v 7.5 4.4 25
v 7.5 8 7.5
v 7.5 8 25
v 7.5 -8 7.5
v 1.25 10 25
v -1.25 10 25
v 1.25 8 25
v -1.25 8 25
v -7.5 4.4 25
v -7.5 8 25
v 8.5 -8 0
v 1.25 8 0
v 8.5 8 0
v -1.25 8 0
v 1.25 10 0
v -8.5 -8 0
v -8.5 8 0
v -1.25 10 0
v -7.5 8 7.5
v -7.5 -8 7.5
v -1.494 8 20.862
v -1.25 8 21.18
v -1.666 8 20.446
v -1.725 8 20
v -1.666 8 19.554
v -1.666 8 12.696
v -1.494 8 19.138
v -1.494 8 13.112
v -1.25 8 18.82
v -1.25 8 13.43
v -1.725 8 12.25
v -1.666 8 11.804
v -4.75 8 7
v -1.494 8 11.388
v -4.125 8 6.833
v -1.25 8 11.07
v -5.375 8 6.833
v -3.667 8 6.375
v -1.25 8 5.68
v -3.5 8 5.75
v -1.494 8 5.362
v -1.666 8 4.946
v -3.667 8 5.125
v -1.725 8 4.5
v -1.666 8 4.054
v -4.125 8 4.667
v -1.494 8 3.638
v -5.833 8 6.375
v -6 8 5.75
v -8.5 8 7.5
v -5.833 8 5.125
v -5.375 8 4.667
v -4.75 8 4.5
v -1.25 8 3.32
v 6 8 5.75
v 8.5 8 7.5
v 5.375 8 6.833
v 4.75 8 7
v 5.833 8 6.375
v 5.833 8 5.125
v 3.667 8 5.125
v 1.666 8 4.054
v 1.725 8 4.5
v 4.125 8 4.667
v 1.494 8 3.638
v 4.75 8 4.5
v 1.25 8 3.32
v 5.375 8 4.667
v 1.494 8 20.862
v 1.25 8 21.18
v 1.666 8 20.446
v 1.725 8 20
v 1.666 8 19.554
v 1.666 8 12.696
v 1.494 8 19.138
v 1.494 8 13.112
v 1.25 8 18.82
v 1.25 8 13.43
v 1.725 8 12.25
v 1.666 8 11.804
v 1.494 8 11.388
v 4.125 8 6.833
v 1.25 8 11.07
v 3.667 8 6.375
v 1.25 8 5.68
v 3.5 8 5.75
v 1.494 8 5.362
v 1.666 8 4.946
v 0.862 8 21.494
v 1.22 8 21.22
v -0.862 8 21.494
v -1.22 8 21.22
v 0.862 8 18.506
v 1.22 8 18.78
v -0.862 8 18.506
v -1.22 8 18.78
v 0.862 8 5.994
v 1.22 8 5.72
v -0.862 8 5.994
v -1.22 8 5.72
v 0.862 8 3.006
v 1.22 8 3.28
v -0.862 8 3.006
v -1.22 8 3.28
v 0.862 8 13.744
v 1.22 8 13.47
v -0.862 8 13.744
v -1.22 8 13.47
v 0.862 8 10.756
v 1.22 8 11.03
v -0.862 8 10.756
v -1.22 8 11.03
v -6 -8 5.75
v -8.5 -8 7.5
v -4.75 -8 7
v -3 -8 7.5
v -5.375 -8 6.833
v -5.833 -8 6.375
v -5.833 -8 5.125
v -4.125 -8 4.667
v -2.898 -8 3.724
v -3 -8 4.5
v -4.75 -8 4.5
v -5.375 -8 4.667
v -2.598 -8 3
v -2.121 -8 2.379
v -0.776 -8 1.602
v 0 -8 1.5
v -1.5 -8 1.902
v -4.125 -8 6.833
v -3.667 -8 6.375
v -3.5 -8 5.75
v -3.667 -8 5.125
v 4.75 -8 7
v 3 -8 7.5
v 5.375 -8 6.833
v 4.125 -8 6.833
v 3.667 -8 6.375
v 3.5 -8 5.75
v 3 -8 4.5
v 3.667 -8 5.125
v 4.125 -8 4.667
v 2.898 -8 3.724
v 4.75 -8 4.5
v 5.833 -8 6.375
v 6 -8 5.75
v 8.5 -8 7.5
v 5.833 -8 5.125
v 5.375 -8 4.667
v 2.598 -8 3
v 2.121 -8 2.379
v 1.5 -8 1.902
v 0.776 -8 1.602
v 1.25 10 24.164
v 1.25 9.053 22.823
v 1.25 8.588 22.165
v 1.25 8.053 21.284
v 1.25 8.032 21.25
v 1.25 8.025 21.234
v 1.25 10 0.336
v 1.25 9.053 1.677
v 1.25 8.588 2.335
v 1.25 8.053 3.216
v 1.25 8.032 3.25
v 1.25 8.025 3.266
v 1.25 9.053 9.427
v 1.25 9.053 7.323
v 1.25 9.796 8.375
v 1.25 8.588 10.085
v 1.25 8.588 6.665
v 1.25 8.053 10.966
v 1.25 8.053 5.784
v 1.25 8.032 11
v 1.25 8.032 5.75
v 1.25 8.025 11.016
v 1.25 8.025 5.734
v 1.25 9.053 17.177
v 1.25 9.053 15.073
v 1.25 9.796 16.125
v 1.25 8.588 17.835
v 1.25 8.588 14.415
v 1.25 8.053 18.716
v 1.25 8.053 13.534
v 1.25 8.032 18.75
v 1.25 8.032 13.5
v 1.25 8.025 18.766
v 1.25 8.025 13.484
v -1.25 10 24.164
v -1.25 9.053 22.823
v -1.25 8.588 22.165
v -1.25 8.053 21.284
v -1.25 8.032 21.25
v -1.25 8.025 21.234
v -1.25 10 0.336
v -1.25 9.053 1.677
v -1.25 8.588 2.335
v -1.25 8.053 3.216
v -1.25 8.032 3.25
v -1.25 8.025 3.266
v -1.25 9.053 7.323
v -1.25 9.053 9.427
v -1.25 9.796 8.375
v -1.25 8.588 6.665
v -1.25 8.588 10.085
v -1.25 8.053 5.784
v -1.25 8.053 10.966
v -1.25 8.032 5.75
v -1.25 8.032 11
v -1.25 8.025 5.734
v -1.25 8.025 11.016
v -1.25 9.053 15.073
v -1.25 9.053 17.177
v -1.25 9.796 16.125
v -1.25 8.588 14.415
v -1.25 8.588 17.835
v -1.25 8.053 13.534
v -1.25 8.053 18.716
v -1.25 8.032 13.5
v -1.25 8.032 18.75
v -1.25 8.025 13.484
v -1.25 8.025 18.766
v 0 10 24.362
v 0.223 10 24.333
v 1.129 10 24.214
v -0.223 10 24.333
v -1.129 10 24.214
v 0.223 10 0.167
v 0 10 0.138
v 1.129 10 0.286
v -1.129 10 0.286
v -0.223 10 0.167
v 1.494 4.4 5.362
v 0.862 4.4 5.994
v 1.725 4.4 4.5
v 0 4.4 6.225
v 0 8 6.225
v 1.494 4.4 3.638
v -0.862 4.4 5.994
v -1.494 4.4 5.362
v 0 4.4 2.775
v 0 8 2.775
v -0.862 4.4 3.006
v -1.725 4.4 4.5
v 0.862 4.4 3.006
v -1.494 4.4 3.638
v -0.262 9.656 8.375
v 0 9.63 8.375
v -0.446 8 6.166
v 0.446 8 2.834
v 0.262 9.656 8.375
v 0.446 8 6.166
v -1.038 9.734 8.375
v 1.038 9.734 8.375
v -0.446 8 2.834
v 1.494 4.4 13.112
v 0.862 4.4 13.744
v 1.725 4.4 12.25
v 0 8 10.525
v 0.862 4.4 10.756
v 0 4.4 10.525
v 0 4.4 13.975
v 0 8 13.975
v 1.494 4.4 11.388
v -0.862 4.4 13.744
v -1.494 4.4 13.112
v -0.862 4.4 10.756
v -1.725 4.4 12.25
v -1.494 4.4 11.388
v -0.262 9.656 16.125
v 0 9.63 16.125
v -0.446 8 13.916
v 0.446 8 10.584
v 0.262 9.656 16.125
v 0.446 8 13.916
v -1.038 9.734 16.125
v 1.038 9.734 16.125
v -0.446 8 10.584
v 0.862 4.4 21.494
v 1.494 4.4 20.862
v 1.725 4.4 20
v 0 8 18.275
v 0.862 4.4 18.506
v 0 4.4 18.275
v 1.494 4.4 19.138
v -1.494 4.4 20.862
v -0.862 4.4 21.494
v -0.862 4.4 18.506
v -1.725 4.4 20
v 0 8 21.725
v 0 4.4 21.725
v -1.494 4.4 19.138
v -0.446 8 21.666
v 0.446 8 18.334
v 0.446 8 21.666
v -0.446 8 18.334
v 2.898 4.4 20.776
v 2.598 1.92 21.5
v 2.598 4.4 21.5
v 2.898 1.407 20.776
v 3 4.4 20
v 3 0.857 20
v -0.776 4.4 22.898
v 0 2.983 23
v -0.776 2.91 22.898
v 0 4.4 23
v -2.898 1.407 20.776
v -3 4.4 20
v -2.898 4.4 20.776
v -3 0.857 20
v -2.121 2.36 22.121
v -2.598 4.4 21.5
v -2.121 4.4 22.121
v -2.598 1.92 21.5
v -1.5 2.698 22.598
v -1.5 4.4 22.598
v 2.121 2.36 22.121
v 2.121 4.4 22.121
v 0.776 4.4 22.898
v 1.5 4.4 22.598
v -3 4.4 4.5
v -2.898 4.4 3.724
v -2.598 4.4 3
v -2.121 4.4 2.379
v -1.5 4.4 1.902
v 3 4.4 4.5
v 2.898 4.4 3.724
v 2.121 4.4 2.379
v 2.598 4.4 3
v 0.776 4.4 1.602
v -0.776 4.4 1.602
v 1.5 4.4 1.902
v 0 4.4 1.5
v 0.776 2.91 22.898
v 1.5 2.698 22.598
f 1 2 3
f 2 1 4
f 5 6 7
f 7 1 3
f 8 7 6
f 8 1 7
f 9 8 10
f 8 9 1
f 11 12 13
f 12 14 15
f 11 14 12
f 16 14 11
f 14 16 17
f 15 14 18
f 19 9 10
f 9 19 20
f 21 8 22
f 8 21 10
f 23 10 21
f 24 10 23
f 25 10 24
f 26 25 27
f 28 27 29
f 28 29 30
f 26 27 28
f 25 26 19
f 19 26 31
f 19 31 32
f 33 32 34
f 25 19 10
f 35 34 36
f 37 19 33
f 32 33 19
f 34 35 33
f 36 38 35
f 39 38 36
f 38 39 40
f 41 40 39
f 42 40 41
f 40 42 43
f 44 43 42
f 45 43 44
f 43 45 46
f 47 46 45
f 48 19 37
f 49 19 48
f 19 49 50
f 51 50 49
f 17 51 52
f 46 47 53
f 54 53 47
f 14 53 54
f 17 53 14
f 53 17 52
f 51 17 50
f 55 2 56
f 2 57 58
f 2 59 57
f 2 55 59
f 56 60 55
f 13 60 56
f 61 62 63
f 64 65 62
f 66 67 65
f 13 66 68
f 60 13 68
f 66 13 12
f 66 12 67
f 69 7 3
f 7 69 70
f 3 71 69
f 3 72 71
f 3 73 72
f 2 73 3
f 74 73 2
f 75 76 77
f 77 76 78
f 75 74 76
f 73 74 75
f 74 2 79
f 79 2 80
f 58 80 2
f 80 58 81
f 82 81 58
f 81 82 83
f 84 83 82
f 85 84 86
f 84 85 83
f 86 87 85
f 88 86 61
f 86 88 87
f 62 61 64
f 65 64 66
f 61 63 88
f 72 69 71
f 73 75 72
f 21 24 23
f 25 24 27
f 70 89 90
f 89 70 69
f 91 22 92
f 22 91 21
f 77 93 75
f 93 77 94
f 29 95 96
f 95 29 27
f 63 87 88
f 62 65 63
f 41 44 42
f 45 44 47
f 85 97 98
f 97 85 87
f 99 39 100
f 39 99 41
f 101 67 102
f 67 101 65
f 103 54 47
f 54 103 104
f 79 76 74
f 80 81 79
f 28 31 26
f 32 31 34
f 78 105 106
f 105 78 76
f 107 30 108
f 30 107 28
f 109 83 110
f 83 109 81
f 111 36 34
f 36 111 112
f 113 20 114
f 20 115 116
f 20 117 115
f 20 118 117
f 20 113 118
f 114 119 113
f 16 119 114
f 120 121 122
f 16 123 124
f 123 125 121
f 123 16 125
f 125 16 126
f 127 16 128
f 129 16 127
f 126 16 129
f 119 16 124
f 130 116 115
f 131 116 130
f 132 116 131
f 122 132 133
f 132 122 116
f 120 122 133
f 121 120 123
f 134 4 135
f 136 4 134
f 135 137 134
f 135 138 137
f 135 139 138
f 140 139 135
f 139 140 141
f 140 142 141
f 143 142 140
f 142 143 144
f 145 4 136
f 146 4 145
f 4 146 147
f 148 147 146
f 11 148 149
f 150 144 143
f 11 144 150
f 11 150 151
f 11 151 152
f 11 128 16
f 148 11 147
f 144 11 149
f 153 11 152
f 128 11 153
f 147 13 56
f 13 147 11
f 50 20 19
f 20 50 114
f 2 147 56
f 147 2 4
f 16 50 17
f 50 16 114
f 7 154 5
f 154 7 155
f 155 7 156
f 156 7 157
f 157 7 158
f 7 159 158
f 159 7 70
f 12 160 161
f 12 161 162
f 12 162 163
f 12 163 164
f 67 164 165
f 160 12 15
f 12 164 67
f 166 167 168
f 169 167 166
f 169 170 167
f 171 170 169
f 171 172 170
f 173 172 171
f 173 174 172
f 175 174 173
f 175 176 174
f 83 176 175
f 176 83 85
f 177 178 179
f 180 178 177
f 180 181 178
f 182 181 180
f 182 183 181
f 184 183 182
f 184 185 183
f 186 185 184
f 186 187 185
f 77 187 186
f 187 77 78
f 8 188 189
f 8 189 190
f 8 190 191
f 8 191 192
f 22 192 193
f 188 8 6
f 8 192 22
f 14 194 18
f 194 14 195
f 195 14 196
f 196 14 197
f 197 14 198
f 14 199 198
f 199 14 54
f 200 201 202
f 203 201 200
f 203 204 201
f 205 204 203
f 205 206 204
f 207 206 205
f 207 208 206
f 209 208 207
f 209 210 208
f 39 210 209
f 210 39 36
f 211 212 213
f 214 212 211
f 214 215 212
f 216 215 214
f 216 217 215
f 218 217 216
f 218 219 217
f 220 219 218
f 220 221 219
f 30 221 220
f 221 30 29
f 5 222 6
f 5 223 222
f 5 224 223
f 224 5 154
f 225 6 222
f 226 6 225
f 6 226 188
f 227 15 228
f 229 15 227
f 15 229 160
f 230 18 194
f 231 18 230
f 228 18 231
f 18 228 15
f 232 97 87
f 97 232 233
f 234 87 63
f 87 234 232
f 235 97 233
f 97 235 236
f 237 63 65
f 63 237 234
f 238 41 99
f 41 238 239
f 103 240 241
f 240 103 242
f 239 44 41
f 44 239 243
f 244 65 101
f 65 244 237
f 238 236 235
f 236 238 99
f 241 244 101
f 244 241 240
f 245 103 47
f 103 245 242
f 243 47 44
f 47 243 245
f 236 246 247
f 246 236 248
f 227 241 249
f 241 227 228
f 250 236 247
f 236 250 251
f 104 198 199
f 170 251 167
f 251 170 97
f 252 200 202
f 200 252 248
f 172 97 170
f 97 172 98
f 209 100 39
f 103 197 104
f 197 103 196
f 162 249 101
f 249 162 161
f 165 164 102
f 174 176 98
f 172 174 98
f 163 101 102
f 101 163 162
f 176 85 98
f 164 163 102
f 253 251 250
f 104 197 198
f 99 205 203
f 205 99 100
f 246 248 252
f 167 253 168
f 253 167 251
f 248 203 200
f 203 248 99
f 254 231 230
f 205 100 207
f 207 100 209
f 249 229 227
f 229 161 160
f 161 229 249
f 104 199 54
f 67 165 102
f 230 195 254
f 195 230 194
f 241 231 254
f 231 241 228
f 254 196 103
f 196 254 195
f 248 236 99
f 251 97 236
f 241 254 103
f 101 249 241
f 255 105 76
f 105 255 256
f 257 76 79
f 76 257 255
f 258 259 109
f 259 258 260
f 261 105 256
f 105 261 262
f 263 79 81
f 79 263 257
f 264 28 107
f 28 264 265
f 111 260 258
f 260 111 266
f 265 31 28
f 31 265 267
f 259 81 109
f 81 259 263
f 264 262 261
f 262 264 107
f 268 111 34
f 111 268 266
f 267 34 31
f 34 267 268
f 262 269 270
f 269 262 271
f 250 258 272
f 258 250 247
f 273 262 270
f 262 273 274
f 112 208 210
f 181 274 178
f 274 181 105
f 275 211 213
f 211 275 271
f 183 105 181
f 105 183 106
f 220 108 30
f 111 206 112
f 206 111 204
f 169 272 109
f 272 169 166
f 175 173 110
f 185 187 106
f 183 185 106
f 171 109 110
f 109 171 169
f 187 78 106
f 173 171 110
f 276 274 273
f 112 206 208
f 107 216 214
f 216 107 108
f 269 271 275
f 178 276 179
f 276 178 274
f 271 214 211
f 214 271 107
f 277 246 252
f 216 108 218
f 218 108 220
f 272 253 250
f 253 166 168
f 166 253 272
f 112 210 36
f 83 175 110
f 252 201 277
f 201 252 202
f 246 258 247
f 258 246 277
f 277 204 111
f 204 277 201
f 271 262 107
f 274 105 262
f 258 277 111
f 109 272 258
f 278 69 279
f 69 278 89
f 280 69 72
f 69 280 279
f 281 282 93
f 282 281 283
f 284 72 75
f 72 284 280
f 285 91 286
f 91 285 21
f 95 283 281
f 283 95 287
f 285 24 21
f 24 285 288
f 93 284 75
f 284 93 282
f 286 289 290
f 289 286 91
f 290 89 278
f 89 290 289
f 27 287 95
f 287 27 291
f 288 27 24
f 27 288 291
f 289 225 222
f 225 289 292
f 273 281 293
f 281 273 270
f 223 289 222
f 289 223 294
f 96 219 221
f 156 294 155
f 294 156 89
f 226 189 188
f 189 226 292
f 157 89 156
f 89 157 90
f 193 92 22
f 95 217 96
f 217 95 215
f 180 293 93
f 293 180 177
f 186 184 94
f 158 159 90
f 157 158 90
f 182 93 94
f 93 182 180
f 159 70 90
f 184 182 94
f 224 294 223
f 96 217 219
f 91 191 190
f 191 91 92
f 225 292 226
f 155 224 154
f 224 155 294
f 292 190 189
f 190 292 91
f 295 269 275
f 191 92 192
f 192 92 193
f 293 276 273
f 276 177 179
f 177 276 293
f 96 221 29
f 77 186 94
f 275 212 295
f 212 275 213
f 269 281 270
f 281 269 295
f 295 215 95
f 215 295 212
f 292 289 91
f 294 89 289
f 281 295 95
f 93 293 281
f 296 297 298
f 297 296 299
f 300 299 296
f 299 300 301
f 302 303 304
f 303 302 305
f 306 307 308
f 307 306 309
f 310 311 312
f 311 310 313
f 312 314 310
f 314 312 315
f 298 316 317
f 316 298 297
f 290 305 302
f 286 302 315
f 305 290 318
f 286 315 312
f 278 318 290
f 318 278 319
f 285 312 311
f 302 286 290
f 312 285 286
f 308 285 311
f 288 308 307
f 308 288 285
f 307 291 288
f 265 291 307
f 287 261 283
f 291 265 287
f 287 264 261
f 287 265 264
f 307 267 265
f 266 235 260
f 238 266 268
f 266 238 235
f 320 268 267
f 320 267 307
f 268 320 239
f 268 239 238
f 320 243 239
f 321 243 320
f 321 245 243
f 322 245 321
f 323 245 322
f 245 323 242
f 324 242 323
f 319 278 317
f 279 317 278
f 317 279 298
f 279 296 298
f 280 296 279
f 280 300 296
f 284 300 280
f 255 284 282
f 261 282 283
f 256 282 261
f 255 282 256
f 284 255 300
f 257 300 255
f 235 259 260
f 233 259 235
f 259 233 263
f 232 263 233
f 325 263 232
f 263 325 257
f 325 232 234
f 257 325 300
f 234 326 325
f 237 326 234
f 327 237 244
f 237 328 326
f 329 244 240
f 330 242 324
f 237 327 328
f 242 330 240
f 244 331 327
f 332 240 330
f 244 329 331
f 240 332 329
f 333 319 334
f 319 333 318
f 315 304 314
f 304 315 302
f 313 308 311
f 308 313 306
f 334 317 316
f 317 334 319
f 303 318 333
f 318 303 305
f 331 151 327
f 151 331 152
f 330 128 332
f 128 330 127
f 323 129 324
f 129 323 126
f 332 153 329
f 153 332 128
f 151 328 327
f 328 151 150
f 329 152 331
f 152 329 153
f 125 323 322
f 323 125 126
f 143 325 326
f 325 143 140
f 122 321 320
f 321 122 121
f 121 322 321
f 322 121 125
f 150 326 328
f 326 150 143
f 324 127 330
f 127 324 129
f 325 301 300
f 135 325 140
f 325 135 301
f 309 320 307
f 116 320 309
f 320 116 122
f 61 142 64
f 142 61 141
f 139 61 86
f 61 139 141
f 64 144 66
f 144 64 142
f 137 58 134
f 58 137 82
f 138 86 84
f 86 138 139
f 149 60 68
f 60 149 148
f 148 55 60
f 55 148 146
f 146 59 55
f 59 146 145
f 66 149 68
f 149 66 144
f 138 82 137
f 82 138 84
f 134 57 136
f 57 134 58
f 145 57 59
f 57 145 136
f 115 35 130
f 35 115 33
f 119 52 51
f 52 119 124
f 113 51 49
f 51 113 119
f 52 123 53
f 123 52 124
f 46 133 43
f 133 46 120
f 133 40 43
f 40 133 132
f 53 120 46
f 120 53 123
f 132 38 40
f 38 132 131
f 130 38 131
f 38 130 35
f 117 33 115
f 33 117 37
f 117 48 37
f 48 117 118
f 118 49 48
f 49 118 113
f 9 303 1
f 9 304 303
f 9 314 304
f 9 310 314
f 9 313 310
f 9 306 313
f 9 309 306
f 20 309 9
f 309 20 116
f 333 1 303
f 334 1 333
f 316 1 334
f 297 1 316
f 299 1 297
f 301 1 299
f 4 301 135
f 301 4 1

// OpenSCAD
// file: microswitch.scad
/**
 * @author Johann Rocholl <johann@rocholl.net>
 * @license GPL-3.0
 */

// Don't print this file, purchase real micro switches
// e.g. Honeywell ZM10B10A01 or OMRON SS-5 or similar.

module microswitch() {
  difference() {
    union() {
      translate([0, 0, 2.5])
        cube([19.8, 6, 10], center=true);
      translate([2.5, 0.5, 6])
        cube([2, 3.5, 5], center=true);
      for (x = [-8, -1, 8]) {
        translate([x, 0, 0])
          cube([0.6, 3.2, 13], center=true);
      }
    }
    for (x = [-9.5/2, 9.5/2]) {
      translate([x, 0, 0]) rotate([90, 0, 0])
        cylinder(r=2.5/2, h=20, center=true, $fn=12);
    }
  }
}

microswitch();
// file: configuration.scad
// Increase this if your slicer or printer make holes too tight.
extra_radius = 0.1;

// OD = outside diameter, corner to corner.
m3_nut_od = 6.1;
m3_nut_radius = m3_nut_od/2 + 0.2 + extra_radius;
m3_nut_thickness = 2.4 + extra_radius;
m3_washer_radius = 3.5 + extra_radius;

// Major diameter of metric 3mm thread.
m3_major = 2.85;
m3_radius = m3_major/2 + extra_radius;
m3_wide_radius = m3_major/2 + extra_radius + 0.2;

// OD = outside diameter, corner to corner.
m4_nut_od = 7.1;
m4_nut_radius = m4_nut_od/2 + 0.2 + extra_radius;
m4_thickness = 3.82 + extra_radius;
m4_washer_radius = 4.5 + extra_radius;

// Major diameter of metric 3mm thread.
m4_major = 3.85;
m4_radius = m4_major/2 + extra_radius;
m4_wide_radius = m4_major/2 + extra_radius + 0.2;

// NEMA17 stepper motors.
motor_shaft_diameter = 5;
motor_shaft_radius = motor_shaft_diameter/2 + extra_radius;

// Frame brackets. M3x8mm screws work best with 3.6 mm brackets.
thickness = 3.6;

// OpenBeam or Misumi. Currently only 15x15 mm, but there is a plan
// to make models more parametric and allow 20x20 mm in the future.
extrusion = 15;

// Placement for the NEMA17 stepper motors.
motor_offset = 44;
motor_length = 47;
// main file
include <configuration.scad>;

use <microswitch.scad>;

thickness = 16;  // 1mm thicker than linear rail.
width = 15;  // Same as vertical extrusion.
height = 25;
bolts = 3;

endstop_height = 15/2;
offset = 8;
top_gap = 2;

module endstop() {
working_length = height - 15/2 + offset;

difference() {
    union() {
      cube([width, thickness, height], center=true);
      translate([0, 0, -height/2 + endstop_height/2])
        cube([width+2, thickness, endstop_height], center=true);
      translate([0, 2, 0])
        cube([2.5, thickness, height], center=true);
    }
translate([0, 0, -height/2 + endstop_height])
    polyhedron(
        points = [
            [-(width+2)/2, -thickness/2, height-endstop_height], //x=0, y=0, z=0
            [(width+2)/2, -thickness/2, height-endstop_height],  //x=1, y=0, z=0
            [-(width+2)/2, -thickness/2, 0], //x=0, y=1, z=0
            [(width+2)/2, -thickness/2, 0], //x=1, y=1, z=0
            [-(width+2)/2, thickness/2 - 3.6, height-endstop_height], //x=0, y=1, z=1
            [(width+2)/2, thickness/2 - 3.6, height-endstop_height], //x=1, y=1, z=1
        ],
        faces = [
            [0,1,2],
            [1,3,2],
            [0,2,4],
            [3,1,5],
            [2,3,4],
            [4,3,5],
            [1,0,5],
            [0,4,5],
        ]
    );
    rotate([90, 0, 0]) {
        hole_rad = 3;
//        translate([0, endstop_height, 3.6])
//            cube([width+2, height, thickness], center=true);
        translate([0, working_length/2 - hole_rad - top_gap + endstop_height/2 - offset/2, 3.6-thickness/2])
            cylinder(r=hole_rad, h=20, $fn=24);
        translate([0, -(working_length/2 - hole_rad - top_gap) + endstop_height/2 - offset/2, 3.6-thickness/2])
            cylinder(r=hole_rad, h=20, $fn=24);
        translate([0, endstop_height/2 - offset/2, 3.6-thickness/2 + thickness])
          cube([6, working_length - hole_rad*2 - top_gap*2, thickness*2], center=true);
        for (i = [-1:3/bolts:1]){
            translate([0, i*(working_length/2 - hole_rad - top_gap) + endstop_height/2 - offset/2, -thickness/2]){
                cylinder(r=m3_wide_radius, h=20, center=true, $fn=12);
                scale([1, 1, -1])
                    cylinder(r1=m3_wide_radius, r2=7, h=4, $fn=24);
            }
        }
    }
    translate([0, -3-thickness/2, -height/2 + 15/4 + 2]) rotate([0, 180, 0]) {
      % microswitch();
      for (x = [-9.5/2, 9.5/2]) {
        translate([x, 0, 0]) rotate([90, 0, 0])
          cylinder(r=2.5/2, h=thickness*3, center=true, $fn=12);
      }
    }
  }
}

translate([0, 0, height/2]) endstop();
